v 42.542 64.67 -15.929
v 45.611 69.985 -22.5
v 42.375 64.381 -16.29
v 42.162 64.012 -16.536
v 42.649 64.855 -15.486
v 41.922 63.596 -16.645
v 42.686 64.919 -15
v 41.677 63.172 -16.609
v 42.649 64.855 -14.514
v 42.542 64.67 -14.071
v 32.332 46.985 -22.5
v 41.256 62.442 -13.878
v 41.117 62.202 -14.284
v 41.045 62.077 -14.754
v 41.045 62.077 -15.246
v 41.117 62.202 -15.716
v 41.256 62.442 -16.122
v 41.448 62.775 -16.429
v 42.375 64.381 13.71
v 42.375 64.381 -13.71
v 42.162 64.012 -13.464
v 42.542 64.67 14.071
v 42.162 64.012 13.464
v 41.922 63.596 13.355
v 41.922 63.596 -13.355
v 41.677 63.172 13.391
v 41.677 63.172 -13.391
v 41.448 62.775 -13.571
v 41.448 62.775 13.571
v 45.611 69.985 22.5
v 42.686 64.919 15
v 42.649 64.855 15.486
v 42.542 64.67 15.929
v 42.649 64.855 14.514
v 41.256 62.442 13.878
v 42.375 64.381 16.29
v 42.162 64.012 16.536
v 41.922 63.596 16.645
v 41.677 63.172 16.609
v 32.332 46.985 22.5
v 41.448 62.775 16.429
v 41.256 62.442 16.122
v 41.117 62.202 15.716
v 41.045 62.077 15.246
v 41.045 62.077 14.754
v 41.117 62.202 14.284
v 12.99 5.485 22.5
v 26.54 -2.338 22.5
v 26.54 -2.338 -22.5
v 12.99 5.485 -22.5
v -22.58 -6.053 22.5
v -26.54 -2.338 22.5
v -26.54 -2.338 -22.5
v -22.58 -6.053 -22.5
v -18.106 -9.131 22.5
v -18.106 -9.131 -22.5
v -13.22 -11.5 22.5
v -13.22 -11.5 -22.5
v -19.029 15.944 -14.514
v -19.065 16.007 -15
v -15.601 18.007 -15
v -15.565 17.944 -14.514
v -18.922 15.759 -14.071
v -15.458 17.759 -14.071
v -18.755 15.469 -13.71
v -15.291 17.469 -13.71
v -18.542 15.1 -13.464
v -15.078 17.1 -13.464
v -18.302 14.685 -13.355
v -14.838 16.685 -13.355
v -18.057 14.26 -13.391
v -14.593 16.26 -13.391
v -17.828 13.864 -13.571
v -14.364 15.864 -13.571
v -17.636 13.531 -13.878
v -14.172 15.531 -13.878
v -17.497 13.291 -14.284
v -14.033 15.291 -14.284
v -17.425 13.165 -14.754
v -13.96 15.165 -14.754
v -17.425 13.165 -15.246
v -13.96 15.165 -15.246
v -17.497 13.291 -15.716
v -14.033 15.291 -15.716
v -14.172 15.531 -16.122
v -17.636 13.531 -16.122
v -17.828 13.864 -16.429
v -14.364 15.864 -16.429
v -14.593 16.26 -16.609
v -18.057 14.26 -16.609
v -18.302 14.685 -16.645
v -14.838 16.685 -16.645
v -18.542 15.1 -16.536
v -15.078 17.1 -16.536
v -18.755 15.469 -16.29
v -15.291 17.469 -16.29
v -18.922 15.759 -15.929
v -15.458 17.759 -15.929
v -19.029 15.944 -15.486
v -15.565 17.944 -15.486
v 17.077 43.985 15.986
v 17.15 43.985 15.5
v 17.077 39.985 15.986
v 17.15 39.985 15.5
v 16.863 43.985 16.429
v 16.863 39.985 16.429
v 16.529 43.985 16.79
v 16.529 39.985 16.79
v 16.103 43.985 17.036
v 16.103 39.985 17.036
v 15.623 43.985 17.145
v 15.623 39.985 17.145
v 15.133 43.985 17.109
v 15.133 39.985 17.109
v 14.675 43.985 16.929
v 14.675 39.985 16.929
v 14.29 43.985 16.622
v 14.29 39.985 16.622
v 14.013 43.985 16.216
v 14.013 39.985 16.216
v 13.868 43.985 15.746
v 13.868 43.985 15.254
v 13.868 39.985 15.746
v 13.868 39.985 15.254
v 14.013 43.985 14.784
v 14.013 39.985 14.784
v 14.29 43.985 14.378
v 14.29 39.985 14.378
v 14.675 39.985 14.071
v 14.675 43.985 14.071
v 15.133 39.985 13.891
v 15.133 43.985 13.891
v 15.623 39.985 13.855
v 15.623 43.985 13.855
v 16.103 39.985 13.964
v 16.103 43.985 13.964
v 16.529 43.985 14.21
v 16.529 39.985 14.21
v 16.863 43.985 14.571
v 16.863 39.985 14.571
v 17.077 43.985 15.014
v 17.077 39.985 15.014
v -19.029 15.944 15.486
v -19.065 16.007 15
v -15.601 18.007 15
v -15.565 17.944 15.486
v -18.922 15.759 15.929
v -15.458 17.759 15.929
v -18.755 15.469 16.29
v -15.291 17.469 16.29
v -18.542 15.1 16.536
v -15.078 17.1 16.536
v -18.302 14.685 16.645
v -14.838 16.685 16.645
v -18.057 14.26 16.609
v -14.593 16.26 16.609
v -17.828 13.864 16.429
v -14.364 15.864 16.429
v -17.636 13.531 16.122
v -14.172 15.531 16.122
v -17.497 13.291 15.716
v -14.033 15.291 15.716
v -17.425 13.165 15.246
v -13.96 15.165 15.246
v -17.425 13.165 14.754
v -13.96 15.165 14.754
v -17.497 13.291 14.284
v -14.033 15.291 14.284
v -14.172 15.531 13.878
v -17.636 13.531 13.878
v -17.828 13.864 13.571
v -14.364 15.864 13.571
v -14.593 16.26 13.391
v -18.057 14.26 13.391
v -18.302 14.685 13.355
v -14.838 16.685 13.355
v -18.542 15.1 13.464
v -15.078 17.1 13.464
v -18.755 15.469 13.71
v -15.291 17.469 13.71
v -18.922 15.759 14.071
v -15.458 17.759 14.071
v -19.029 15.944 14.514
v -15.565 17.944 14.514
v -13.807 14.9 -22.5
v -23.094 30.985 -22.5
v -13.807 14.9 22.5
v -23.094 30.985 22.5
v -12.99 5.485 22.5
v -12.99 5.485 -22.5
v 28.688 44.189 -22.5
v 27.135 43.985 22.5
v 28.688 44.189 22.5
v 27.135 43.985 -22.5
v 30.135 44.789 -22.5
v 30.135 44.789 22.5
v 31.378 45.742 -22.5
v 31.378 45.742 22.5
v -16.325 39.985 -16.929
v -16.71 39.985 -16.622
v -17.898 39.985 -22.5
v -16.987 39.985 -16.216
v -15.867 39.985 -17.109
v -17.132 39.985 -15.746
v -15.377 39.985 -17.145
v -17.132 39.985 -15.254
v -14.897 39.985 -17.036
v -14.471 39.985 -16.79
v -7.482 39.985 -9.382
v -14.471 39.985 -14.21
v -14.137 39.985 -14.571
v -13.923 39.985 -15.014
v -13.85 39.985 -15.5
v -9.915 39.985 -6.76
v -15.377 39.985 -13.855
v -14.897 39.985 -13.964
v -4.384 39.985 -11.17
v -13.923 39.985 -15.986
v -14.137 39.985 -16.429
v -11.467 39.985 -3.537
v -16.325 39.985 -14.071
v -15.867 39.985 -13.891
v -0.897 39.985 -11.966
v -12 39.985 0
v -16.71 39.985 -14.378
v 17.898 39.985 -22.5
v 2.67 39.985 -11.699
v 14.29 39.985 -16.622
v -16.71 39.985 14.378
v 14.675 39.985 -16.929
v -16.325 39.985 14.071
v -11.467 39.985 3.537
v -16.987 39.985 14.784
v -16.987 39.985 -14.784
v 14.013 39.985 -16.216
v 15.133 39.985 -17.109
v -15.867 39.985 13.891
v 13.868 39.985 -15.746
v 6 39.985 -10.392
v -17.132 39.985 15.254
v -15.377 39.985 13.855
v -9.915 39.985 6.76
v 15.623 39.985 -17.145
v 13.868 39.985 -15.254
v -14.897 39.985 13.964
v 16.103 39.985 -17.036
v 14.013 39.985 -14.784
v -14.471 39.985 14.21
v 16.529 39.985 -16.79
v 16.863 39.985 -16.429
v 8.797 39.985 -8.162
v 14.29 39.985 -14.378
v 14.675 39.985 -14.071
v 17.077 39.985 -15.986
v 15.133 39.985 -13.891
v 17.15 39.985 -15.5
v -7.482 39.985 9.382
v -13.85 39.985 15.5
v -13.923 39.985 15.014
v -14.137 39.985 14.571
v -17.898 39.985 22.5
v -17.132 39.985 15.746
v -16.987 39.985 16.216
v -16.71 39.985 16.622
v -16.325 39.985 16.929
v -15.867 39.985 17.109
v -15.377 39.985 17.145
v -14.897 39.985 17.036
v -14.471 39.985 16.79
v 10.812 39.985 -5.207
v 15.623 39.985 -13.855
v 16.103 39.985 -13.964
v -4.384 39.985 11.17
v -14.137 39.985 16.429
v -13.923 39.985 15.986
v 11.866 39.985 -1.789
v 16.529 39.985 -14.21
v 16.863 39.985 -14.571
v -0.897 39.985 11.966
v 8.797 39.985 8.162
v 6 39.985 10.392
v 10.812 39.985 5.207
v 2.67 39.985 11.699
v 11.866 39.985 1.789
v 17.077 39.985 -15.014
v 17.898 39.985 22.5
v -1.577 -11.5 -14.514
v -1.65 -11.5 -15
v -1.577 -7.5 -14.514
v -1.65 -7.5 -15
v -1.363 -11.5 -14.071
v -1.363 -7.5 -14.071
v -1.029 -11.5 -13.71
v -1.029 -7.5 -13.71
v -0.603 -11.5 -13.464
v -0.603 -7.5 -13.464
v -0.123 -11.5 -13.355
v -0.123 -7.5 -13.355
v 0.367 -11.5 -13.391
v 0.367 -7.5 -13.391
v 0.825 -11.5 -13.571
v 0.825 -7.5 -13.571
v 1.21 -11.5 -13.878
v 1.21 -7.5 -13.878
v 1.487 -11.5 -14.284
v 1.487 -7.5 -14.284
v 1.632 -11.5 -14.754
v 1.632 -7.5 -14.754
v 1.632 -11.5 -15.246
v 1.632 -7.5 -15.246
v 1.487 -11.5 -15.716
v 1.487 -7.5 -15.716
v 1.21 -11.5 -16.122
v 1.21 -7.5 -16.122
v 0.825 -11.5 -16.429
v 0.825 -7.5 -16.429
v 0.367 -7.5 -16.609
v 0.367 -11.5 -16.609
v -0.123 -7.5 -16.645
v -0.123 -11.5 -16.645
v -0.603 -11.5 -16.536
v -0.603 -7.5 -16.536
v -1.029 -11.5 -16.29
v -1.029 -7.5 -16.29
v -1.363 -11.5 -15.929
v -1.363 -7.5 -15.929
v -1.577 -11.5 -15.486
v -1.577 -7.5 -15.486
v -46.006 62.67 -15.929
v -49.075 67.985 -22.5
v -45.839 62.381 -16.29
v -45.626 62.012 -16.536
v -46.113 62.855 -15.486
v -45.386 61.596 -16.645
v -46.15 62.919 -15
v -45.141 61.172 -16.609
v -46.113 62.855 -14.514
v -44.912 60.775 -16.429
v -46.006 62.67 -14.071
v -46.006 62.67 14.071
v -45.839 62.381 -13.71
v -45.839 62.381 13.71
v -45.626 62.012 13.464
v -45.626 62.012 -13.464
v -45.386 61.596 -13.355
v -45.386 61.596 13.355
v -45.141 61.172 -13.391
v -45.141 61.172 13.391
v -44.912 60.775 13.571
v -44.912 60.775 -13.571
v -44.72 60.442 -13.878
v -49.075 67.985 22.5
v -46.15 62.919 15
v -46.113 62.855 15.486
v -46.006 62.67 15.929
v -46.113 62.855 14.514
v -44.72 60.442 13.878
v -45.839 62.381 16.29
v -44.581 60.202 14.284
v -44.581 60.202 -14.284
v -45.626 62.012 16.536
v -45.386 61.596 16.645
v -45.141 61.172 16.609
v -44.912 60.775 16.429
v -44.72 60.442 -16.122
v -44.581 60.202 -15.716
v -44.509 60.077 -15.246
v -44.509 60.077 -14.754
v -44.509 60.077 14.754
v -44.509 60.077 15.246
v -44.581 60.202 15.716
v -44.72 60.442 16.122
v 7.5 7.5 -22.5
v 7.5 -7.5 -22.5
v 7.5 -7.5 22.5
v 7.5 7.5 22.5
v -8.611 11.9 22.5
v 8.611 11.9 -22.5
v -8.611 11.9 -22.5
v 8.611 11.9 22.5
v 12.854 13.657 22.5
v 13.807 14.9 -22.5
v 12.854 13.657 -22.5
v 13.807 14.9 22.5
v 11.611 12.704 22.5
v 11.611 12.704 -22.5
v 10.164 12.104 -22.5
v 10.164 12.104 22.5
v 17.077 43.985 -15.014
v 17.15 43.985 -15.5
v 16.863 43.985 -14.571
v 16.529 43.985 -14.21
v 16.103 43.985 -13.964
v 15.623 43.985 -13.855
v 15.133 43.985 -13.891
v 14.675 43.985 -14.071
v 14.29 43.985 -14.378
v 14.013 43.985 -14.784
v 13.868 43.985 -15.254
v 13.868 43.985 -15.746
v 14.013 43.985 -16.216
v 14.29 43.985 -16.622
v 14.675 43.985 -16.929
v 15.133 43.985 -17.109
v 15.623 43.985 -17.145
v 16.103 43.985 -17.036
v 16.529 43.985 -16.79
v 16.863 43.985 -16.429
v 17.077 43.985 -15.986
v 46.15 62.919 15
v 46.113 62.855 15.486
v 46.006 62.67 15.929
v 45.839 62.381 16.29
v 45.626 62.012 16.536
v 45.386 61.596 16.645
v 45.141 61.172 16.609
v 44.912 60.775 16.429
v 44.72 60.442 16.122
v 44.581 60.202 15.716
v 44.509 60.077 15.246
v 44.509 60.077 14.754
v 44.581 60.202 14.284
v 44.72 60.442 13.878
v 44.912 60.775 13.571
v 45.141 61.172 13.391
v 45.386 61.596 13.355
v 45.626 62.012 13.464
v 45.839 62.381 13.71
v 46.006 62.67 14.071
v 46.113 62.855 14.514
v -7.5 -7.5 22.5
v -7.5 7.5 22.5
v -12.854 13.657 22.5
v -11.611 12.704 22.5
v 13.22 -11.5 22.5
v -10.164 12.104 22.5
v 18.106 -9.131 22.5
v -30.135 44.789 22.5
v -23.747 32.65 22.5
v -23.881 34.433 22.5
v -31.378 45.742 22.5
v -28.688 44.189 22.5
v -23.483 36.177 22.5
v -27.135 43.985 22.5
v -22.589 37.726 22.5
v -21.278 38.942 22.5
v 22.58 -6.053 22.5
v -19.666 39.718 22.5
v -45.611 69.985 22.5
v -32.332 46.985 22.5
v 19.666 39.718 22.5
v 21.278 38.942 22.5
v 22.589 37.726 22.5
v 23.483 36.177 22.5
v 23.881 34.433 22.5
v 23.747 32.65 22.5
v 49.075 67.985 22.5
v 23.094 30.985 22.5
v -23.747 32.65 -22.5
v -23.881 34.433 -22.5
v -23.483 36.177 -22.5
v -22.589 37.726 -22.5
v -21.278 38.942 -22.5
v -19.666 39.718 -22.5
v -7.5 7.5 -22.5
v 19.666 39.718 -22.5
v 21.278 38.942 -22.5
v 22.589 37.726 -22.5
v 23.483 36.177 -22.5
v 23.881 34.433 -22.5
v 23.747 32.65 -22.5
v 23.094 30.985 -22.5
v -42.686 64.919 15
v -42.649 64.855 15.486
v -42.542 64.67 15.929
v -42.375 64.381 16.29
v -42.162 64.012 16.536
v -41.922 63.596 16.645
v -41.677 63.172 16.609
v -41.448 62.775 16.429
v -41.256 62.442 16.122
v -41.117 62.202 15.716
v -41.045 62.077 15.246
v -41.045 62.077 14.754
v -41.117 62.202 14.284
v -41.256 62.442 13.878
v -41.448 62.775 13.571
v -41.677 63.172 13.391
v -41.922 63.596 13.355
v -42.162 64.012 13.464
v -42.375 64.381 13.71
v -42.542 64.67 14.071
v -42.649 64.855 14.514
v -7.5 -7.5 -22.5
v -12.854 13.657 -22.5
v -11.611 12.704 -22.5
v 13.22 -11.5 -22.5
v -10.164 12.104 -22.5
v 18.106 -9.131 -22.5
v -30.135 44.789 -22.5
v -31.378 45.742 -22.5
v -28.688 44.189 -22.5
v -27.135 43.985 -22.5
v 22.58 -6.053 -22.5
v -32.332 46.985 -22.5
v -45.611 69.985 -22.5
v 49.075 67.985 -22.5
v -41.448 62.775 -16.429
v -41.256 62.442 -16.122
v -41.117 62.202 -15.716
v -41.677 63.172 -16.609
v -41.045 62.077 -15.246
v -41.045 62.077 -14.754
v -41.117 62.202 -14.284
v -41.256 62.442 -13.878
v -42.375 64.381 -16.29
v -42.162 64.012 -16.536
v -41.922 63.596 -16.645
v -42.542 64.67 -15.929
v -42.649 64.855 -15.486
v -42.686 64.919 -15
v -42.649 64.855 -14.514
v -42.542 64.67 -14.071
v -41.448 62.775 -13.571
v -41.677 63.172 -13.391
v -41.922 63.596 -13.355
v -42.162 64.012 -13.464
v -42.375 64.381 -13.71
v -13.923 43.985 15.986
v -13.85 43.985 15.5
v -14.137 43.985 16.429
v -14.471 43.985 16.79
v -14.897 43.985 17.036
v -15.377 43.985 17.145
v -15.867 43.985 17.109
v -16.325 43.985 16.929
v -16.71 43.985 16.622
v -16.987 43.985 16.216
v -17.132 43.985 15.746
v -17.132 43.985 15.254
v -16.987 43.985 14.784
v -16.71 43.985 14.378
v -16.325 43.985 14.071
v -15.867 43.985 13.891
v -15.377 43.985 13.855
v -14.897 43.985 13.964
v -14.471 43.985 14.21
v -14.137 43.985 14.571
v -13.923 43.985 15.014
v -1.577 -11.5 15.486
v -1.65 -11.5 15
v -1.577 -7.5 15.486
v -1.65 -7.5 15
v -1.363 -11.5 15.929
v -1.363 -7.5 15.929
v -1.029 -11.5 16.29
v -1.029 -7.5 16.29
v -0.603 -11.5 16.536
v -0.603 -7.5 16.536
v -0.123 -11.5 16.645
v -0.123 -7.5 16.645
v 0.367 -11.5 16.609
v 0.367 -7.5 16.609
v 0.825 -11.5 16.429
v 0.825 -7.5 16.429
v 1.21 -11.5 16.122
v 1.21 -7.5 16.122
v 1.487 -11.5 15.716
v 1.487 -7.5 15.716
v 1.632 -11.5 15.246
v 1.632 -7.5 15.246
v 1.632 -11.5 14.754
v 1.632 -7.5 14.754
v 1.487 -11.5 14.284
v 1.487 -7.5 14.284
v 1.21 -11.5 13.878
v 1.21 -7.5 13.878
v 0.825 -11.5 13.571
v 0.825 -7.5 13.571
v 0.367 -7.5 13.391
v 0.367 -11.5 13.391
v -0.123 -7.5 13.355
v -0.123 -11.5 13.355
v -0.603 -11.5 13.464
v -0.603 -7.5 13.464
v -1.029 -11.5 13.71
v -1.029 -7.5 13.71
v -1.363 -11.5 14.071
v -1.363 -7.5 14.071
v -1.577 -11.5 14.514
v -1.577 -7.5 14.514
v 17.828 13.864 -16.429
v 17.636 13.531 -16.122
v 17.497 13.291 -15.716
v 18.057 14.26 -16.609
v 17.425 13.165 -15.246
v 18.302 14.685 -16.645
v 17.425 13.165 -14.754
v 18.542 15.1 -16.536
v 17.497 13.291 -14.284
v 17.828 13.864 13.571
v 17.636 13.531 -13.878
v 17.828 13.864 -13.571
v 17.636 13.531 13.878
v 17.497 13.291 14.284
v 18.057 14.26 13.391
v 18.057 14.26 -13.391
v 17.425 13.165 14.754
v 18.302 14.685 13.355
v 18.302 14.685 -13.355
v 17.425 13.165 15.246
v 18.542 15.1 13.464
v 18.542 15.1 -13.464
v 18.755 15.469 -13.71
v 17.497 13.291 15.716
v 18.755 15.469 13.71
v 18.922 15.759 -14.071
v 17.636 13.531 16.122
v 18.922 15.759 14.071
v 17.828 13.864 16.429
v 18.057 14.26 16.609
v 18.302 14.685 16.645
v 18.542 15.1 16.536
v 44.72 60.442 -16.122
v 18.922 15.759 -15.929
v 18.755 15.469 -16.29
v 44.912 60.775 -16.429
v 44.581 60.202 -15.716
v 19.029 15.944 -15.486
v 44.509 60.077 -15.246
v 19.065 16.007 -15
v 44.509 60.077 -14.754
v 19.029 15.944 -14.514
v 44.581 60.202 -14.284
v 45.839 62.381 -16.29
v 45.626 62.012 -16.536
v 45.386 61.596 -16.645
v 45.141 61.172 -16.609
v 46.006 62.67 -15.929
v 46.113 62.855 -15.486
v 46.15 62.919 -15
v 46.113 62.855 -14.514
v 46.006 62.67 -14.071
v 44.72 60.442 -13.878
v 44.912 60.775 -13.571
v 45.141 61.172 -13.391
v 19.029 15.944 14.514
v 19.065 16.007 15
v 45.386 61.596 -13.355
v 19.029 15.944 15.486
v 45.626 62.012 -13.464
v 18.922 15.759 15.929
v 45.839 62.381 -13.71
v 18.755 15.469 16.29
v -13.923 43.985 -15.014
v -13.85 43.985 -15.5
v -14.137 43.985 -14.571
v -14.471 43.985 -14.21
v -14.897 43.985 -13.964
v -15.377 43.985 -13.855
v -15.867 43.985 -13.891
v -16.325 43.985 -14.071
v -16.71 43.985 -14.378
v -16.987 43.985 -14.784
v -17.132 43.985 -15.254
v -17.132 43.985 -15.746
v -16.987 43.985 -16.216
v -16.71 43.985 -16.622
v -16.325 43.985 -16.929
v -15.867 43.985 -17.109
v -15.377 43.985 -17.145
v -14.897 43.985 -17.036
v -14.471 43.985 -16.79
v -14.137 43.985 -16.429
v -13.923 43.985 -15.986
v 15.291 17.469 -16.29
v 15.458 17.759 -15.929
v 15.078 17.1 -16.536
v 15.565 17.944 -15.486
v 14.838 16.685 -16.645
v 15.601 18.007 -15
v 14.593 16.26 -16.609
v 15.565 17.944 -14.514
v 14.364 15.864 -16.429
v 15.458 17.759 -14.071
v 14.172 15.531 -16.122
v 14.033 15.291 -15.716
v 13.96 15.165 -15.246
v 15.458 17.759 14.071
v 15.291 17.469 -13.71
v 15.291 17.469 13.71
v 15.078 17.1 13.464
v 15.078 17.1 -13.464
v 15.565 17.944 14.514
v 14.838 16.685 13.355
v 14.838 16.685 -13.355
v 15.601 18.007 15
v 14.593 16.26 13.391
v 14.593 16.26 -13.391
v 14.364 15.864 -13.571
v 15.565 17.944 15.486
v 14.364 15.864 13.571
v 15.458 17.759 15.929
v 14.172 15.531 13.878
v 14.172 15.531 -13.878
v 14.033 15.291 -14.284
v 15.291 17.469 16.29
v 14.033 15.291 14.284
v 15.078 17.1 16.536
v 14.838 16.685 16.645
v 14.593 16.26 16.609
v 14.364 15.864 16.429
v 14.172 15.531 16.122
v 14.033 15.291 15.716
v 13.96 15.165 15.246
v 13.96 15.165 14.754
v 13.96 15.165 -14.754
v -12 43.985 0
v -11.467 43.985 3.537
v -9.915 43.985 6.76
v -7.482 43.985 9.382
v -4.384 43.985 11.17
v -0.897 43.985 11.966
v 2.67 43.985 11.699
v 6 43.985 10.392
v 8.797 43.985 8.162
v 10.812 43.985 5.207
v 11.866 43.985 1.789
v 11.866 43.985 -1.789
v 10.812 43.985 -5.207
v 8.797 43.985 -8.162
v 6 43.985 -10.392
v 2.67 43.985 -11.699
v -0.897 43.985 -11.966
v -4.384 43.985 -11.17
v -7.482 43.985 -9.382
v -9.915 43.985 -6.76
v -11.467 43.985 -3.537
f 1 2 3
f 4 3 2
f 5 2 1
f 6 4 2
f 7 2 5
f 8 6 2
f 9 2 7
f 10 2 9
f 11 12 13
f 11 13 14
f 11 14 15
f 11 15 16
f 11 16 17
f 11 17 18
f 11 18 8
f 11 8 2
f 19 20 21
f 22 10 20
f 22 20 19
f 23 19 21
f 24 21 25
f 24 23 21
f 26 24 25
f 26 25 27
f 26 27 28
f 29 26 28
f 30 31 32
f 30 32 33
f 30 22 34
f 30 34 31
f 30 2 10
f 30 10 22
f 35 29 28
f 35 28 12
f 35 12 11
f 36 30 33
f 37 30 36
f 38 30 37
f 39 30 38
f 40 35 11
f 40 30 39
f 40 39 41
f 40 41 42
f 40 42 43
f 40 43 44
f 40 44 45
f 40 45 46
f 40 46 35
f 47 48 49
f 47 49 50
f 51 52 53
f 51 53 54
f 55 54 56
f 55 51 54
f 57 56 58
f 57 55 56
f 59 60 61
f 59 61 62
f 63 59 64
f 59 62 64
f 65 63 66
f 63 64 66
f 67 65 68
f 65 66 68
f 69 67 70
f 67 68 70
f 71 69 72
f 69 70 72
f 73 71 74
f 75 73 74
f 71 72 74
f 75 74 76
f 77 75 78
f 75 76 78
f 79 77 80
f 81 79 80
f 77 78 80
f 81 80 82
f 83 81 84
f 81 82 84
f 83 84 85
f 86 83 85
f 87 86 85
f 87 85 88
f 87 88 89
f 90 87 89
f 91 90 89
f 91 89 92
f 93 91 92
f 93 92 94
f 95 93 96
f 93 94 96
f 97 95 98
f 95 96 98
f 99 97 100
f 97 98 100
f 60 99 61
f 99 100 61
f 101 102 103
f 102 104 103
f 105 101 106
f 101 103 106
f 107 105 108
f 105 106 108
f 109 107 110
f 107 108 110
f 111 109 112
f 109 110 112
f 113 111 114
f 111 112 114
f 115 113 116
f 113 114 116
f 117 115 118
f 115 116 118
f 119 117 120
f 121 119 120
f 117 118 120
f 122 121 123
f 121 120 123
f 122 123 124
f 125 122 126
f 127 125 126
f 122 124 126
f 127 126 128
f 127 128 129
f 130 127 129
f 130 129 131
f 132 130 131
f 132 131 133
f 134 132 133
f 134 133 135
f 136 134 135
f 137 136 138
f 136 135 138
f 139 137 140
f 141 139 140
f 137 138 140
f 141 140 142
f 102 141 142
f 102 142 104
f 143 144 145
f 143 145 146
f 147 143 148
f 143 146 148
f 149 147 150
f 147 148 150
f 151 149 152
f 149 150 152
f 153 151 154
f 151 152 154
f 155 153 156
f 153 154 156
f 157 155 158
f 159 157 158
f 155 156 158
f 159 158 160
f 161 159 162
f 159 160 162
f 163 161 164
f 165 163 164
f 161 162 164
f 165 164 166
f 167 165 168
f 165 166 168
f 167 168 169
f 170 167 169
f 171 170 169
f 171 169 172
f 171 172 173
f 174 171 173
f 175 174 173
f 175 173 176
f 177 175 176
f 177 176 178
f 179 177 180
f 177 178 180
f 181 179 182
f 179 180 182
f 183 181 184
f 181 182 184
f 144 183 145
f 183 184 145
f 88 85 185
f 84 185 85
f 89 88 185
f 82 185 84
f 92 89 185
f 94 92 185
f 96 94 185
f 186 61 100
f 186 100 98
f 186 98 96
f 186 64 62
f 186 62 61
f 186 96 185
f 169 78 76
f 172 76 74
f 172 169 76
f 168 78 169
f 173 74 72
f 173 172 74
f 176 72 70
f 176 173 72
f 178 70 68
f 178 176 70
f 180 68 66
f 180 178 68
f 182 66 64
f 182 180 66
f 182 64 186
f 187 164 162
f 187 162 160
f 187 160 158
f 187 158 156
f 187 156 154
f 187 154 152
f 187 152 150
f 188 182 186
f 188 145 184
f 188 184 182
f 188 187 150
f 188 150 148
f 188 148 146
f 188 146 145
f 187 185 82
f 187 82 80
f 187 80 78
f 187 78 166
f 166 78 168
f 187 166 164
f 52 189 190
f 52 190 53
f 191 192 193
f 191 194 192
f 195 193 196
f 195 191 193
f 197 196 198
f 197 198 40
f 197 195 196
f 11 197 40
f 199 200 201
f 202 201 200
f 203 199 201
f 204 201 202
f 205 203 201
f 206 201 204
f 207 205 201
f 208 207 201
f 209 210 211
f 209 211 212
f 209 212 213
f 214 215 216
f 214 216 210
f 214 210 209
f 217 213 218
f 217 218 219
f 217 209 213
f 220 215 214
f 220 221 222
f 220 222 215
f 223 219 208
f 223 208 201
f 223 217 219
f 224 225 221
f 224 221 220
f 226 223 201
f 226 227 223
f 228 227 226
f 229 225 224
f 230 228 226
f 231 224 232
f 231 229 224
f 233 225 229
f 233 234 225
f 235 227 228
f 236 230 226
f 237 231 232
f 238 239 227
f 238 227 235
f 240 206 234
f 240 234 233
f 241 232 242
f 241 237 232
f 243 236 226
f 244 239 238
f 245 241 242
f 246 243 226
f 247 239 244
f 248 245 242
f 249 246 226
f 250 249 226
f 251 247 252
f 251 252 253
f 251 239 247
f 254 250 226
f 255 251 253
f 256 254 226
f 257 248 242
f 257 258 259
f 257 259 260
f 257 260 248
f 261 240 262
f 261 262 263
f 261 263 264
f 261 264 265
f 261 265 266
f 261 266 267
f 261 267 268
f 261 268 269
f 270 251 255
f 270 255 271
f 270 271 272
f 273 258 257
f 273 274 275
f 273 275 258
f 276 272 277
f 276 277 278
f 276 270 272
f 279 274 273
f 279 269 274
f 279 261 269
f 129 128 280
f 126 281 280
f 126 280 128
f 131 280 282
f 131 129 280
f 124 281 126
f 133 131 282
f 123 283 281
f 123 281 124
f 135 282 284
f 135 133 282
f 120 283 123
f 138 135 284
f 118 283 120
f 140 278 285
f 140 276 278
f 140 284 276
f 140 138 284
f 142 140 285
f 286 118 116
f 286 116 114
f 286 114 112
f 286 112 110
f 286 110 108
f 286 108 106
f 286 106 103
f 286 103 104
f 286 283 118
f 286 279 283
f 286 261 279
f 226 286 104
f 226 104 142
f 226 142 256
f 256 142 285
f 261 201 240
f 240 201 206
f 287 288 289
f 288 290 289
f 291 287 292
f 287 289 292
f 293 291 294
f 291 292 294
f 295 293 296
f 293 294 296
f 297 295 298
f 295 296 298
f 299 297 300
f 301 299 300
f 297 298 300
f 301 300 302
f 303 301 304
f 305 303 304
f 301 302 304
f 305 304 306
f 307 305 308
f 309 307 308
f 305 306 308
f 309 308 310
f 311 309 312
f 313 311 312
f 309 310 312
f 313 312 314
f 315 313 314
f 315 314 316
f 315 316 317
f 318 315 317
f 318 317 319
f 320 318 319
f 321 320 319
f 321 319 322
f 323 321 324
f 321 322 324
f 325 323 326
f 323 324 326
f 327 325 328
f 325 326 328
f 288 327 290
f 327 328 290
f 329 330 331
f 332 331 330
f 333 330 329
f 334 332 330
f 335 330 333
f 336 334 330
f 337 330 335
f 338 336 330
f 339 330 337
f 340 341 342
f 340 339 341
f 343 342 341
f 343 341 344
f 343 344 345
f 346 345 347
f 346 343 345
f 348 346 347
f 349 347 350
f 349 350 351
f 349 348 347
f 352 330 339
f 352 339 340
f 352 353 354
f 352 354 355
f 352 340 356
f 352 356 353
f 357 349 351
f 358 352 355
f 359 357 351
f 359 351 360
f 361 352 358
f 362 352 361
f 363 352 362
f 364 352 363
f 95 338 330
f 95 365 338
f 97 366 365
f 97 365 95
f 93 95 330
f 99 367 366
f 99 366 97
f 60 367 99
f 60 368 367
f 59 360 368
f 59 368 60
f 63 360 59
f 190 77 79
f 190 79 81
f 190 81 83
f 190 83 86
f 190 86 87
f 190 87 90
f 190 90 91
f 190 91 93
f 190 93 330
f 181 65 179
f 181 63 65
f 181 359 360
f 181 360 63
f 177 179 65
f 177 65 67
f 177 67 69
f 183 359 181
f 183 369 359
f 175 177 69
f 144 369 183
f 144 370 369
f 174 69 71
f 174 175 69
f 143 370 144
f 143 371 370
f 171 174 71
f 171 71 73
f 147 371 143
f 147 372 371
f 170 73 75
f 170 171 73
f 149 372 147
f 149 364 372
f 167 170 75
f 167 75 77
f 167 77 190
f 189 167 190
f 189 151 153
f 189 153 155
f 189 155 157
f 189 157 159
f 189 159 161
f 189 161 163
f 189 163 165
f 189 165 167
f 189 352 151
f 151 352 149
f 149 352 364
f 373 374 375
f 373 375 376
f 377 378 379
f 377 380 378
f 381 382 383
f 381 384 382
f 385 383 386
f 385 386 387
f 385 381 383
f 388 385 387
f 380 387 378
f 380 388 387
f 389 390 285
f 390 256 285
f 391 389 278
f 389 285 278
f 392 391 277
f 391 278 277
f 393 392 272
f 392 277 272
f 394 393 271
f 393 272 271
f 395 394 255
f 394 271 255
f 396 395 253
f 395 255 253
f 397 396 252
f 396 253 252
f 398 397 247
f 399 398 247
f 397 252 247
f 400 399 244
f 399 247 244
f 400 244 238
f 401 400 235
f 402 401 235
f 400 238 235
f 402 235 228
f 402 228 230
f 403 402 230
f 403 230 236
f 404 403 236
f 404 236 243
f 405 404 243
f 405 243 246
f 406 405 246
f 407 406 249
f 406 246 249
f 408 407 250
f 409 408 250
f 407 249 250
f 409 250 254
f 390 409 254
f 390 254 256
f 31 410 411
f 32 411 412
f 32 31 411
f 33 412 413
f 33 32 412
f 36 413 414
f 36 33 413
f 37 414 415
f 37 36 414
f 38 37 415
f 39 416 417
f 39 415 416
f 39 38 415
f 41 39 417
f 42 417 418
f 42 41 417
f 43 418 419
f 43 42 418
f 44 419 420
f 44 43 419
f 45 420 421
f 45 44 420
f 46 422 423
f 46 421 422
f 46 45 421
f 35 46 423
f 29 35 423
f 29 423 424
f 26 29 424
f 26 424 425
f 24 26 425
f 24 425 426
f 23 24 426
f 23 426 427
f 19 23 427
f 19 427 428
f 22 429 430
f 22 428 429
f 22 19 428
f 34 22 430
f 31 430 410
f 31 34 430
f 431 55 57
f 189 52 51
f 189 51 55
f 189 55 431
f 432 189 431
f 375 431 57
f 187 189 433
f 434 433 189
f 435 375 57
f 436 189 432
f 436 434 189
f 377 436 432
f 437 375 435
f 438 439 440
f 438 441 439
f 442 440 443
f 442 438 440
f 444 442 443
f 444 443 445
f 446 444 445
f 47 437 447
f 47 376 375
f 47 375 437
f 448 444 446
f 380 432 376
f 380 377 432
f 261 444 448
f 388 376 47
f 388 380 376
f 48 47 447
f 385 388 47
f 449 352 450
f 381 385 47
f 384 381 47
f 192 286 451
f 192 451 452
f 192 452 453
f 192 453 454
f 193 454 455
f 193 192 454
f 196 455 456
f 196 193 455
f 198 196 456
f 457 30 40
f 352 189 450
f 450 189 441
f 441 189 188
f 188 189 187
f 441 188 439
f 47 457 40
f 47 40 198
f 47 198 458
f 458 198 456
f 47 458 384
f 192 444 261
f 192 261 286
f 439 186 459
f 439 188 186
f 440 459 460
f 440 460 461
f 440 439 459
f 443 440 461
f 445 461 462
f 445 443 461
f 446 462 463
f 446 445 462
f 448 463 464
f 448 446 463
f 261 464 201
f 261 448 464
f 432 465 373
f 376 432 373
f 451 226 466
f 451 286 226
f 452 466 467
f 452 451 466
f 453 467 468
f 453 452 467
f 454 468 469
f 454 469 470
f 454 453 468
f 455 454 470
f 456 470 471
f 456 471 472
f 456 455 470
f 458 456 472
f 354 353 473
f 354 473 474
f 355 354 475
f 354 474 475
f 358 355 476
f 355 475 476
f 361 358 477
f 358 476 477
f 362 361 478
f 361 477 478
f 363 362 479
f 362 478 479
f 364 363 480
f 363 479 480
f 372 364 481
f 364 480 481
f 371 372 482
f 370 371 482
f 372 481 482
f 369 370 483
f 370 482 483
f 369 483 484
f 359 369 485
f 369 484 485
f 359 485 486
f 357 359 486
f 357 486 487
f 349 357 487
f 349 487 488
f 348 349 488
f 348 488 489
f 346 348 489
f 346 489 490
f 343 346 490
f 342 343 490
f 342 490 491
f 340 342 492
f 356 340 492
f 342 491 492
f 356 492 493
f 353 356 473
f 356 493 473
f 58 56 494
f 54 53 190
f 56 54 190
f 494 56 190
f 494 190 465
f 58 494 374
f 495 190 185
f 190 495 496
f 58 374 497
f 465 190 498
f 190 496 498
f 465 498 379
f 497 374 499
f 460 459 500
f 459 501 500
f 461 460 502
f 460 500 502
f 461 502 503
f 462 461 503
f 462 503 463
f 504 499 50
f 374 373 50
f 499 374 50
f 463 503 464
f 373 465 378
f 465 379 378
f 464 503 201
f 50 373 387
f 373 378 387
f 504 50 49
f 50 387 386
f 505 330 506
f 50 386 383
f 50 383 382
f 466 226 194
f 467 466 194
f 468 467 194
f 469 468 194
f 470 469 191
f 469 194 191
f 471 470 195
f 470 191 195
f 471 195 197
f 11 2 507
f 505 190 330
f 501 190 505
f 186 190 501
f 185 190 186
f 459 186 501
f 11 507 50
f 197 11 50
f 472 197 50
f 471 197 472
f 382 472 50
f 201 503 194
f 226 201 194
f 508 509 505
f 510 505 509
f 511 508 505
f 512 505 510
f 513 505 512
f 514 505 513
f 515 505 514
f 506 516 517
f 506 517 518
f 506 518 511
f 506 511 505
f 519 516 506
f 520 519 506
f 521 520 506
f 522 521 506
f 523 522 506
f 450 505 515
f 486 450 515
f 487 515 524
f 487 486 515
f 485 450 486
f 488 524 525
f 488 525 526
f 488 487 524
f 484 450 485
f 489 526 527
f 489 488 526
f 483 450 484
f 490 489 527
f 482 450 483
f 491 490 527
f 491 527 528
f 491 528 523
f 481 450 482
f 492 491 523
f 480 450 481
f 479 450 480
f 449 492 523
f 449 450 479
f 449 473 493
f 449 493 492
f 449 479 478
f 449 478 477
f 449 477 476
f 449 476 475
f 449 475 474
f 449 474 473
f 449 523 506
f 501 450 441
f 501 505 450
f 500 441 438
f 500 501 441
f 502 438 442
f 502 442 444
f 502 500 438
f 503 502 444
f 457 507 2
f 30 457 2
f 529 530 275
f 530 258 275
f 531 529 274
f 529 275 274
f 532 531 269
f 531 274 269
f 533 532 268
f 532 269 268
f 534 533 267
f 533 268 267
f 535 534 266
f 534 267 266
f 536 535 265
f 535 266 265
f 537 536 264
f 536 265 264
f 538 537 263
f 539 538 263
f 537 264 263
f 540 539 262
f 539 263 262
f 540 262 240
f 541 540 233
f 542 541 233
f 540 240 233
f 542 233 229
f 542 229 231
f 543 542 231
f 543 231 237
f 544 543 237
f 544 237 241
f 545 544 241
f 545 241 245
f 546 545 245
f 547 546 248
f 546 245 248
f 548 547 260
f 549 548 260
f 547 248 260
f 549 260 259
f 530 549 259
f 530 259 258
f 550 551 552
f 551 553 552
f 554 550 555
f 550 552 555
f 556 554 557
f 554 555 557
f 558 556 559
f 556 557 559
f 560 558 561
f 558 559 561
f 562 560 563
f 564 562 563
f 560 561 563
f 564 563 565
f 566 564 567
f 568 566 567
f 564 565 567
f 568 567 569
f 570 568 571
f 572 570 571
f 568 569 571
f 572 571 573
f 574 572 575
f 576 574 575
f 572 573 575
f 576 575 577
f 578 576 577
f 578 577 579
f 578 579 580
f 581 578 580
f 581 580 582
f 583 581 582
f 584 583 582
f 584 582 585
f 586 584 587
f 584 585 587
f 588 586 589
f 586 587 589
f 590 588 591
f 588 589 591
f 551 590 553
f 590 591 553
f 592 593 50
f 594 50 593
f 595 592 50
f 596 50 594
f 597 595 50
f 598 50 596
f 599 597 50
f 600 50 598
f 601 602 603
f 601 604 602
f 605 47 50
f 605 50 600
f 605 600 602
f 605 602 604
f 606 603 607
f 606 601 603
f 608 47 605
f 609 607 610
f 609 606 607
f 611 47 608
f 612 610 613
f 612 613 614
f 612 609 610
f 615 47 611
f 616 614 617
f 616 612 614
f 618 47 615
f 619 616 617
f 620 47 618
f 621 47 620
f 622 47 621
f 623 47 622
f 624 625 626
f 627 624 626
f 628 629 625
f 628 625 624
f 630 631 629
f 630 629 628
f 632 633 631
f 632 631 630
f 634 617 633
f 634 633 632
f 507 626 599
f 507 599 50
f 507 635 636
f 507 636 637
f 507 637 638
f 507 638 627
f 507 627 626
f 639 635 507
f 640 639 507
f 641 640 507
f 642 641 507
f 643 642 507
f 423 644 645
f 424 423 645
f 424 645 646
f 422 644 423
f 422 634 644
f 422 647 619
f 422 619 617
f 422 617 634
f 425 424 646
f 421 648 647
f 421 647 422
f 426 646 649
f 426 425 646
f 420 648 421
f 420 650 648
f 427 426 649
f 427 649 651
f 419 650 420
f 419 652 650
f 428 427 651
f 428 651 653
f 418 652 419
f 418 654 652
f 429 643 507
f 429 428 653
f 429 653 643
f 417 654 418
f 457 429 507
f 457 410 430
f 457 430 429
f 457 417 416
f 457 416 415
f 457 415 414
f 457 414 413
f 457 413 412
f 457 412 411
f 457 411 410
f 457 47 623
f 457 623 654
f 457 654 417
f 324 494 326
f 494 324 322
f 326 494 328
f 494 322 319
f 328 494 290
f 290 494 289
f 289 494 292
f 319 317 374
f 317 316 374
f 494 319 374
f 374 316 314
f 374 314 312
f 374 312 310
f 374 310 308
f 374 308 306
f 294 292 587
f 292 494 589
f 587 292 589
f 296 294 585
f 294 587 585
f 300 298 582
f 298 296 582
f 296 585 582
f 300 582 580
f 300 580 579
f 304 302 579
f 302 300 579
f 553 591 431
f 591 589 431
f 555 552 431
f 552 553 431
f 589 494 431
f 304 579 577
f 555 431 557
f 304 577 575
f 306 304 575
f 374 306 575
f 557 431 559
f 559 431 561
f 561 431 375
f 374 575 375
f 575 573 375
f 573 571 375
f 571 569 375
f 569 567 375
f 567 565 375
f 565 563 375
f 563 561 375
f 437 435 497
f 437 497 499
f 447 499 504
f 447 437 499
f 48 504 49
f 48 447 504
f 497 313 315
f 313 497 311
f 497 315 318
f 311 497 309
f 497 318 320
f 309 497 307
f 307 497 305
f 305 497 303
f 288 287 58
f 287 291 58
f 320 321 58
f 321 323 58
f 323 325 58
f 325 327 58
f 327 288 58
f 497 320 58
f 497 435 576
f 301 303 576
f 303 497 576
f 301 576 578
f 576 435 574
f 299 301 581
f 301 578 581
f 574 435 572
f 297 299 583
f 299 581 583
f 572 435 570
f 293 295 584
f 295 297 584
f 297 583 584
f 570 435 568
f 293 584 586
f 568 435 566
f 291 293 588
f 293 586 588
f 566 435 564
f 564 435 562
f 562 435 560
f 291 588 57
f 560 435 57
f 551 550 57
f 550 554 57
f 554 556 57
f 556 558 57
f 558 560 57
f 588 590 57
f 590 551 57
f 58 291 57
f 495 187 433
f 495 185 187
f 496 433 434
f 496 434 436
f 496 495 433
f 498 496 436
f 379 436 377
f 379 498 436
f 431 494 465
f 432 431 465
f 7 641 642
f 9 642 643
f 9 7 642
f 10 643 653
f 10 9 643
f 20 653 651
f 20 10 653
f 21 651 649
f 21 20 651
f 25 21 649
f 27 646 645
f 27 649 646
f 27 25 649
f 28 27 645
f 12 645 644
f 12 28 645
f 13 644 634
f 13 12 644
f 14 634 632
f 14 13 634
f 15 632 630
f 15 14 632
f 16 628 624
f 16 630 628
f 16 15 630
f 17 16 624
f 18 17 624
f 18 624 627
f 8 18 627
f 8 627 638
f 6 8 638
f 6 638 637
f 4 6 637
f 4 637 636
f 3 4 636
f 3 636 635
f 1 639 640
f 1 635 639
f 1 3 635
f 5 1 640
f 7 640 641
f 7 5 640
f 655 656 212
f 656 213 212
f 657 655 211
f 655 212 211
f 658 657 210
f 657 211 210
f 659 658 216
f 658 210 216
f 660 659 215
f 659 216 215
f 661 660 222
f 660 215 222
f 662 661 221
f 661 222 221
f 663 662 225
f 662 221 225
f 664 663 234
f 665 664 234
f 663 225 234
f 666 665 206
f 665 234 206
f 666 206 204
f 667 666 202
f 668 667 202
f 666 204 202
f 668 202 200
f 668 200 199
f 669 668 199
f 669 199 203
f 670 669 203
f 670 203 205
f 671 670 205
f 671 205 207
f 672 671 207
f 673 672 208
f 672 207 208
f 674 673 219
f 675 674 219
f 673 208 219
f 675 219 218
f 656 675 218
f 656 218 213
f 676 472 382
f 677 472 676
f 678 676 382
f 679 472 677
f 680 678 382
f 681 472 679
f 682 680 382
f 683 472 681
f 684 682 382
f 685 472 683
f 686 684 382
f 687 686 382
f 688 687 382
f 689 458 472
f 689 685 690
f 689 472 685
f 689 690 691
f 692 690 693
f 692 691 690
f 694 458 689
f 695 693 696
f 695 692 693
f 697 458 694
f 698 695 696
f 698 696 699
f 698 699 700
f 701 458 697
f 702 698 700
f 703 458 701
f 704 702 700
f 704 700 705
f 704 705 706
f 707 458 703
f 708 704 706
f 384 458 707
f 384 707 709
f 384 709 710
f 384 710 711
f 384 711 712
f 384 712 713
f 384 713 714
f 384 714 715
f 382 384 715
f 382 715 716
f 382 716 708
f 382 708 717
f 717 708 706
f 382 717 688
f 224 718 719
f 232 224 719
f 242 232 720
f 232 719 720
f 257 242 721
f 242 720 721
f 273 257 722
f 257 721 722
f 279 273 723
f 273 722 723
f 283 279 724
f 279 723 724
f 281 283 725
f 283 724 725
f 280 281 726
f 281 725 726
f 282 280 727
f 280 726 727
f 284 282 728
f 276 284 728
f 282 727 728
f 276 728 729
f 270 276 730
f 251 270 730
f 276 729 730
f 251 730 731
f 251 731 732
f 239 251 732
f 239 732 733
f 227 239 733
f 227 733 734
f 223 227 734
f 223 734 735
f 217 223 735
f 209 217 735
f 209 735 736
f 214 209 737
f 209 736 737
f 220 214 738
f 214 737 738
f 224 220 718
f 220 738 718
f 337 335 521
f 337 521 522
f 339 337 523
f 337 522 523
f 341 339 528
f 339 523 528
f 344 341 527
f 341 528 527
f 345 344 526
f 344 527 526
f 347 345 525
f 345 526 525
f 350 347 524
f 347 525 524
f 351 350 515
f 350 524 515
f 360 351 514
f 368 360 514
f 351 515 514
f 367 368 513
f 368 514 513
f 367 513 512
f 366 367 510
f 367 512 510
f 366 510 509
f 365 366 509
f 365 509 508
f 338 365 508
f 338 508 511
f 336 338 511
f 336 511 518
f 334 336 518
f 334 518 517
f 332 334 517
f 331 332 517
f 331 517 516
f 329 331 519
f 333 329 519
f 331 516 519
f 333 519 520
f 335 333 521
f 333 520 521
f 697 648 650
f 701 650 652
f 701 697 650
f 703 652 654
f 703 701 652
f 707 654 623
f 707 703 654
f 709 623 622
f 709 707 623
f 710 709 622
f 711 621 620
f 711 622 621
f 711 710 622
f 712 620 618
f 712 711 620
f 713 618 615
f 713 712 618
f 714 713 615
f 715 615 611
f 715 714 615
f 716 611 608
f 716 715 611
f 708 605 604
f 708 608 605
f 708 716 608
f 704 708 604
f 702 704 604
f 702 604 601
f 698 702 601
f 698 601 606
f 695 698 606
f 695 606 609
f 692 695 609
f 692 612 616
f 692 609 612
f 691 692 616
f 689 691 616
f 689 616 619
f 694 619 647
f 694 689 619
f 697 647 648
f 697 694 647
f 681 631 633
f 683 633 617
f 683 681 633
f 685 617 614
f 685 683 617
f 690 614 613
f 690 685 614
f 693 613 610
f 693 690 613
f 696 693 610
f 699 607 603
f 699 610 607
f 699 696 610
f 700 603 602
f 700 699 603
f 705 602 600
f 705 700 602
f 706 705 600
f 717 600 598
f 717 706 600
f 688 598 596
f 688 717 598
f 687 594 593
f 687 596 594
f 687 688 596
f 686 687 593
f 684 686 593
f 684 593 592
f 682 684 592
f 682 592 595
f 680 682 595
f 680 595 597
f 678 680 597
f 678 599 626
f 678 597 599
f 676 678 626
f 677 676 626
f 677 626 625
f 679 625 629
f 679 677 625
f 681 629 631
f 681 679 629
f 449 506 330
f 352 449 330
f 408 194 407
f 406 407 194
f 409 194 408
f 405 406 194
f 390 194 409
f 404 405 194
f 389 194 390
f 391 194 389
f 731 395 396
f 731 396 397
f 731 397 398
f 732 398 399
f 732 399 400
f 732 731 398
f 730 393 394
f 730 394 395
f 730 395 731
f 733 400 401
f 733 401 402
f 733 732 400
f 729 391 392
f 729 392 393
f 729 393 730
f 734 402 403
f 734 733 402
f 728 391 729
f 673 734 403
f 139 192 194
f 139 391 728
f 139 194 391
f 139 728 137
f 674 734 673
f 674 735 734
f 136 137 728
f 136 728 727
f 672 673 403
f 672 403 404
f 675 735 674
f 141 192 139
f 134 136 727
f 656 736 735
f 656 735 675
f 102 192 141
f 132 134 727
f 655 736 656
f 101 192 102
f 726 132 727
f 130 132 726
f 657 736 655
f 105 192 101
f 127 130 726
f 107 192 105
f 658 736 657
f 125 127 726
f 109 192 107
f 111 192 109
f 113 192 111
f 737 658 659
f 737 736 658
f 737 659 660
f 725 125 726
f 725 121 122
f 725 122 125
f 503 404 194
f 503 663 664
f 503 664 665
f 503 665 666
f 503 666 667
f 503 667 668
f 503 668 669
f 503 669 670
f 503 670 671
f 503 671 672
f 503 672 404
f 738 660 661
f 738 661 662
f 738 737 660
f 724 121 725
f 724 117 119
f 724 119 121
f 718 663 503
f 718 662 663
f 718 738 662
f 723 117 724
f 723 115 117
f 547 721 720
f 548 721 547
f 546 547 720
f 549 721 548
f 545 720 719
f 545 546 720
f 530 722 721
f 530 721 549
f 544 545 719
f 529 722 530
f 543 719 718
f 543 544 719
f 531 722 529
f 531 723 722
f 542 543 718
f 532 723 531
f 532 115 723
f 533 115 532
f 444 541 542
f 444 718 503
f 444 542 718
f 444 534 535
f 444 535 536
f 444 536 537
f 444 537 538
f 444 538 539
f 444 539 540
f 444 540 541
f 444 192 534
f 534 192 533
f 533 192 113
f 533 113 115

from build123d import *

# Parameters (mm, degrees)
F0_W      = 15
F0_H      = 15
F1_DEPTH  = 22.5
F2_R      = 12
F3_DEPTH  = 4
F4_D      = 3.3
F4_DEPTH  = 4
F4_TIP    = 0.9914200214
F6_D      = 3.3
F6_DEPTH  = 4
F6_TIP    = 0.9914200214
F7_R      = 6
F9_DEPTH  = 45
F11_D     = 3.3
F11_DEPTH = 4
F11_TIP   = 0.9914200214


# Not quite as in the source:
# - a pattern or mirror of a feature is missing from the dataset's text; its kind, count and spacing are read off the source's solid


with BuildPart() as f1:
    # F0 (on Top) → F1 (new body, symmetric)
    with BuildSketch(Plane.XY):
        with BuildLine():
            Line((-30.5995642671, 43.9848275573), (-45.610671266, 69.9848275573))
            Line((-45.610671266, 69.9848275573), (-49.0747728811, 67.9848275573))
            Line((-49.0747728811, 67.9848275573), (-12.9903810568, 5.4848275573))
            Line((-12.9903810568, 5.4848275573), (-26.5403215145, -2.3382342135))
            ThreePointArc((-26.5403215145, -2.3382342135), (-14.4977545891, -10.966881228), (0, -14.0151724427))
            ThreePointArc((0, -14.0151724427), (14.4977545891, -10.966881228), (26.5403215145, -2.3382342135))
            Line((26.5403215145, -2.3382342135), (12.9903810568, 5.4848275573))
            Line((12.9903810568, 5.4848275573), (49.0747728811, 67.9848275573))
            Line((49.0747728811, 67.9848275573), (45.610671266, 69.9848275573))
            Line((45.610671266, 69.9848275573), (30.5995642671, 43.9848275573))
            Line((30.5995642671, 43.9848275573), (28.2901631903, 39.9848275573))
            Line((28.2901631903, 39.9848275573), (12.0753804399, 11.9))
            Line((12.0753804399, 11.9), (0, 11.9))
            Line((0, 11.9), (-12.0753804399, 11.9))
            Line((-12.0753804399, 11.9), (-28.2901631903, 39.9848275573))
            Line((-28.2901631903, 39.9848275573), (-30.5995642671, 43.9848275573))
        make_face()
        Rectangle(F0_W, F0_H, mode=Mode.SUBTRACT)
        Polygon((0, 43.9848275573), (-30.5995642671, 43.9848275573), (-28.2901631903, 39.9848275573), (0, 39.9848275573), (28.2901631903, 39.9848275573), (30.5995642671, 43.9848275573), align=None)
    extrude(amount=F1_DEPTH, both=True)

    # F2 (on face) → F3 (cut, through all)
    with BuildSketch(Plane(origin=(0, 43.9848275573, 0), x_dir=(-1, 0, 0), z_dir=(0, 1, 0))):
        Circle(F2_R)
    extrude(amount=-F3_DEPTH, mode=Mode.SUBTRACT)

    # F4
    with Locations(Plane(origin=(0, 43.9848275573, 0), x_dir=(-1, 0, 0), z_dir=(0, 1, 0))):
        with Locations((15.5, 15.5), (15.5, -15.5), (-15.5, -15.5), (-15.5, 15.5)):
            Hole(F4_D / 2, depth=F4_DEPTH)
            with Locations((0, 0, -(F4_DEPTH + F4_TIP / 2))):  # 118° drill point
                Cone(0, F4_D / 2, F4_TIP, mode=Mode.SUBTRACT)

    # F6
    with Locations(Plane(origin=(-7.3677857926, -4.2537931107, 0), x_dir=(0.5, -0.8660254038, 0), z_dir=(-0.8660254038, -0.5, 0))):
        with Locations((-21.7451905284, -15), (-75.9139741771, -15), (-75.9139741771, 15), (-21.7451905284, 15)):
            f6 = Hole(F6_D / 2, depth=F6_DEPTH)
            with Locations((0, 0, -(F6_DEPTH + F6_TIP / 2))):  # 118° drill point
                Cone(0, F6_D / 2, F6_TIP, mode=Mode.SUBTRACT)

    # F6_copies: F6 across plane
    add(f6.mirror(Plane(origin=(0, 0, 0), x_dir=(0, 0, 1), z_dir=(1, 0, 0))), mode=Mode.SUBTRACT)

    # F7
    f7_edges = [f1.edges().sort_by_distance(p)[0] for p in [
        (-28.290163, 39.984828, 0),
        (-12.07538, 11.9, 0),
        (12.07538, 11.9, 0),
        (28.290163, 39.984828, 0),
        (-30.599564, 43.984828, 0),
        (30.599564, 43.984828, 0),
    ]]
    fillet(f7_edges, radius=F7_R)

    # F8 (on face) → F9 (cut, through all)
    with BuildSketch(Plane.XY.offset(22.5)):
        with BuildLine():
            Line((13.2199214619, -11.5), (-13.2199214619, -11.5))
            ThreePointArc((-13.2199214619, -11.5), (0, -14.0151724427), (13.2199214619, -11.5))
        make_face()
    extrude(amount=-F9_DEPTH, mode=Mode.SUBTRACT)

    # F11
    with Locations(Plane.XZ.offset(11.5)):
        with Locations((0, 15), (0, -15)):
            Hole(F11_D / 2, depth=F11_DEPTH)
            with Locations((0, 0, -(F11_DEPTH + F11_TIP / 2))):  # 118° drill point
                Cone(0, F11_D / 2, F11_TIP, mode=Mode.SUBTRACT)


solid = f1.part
